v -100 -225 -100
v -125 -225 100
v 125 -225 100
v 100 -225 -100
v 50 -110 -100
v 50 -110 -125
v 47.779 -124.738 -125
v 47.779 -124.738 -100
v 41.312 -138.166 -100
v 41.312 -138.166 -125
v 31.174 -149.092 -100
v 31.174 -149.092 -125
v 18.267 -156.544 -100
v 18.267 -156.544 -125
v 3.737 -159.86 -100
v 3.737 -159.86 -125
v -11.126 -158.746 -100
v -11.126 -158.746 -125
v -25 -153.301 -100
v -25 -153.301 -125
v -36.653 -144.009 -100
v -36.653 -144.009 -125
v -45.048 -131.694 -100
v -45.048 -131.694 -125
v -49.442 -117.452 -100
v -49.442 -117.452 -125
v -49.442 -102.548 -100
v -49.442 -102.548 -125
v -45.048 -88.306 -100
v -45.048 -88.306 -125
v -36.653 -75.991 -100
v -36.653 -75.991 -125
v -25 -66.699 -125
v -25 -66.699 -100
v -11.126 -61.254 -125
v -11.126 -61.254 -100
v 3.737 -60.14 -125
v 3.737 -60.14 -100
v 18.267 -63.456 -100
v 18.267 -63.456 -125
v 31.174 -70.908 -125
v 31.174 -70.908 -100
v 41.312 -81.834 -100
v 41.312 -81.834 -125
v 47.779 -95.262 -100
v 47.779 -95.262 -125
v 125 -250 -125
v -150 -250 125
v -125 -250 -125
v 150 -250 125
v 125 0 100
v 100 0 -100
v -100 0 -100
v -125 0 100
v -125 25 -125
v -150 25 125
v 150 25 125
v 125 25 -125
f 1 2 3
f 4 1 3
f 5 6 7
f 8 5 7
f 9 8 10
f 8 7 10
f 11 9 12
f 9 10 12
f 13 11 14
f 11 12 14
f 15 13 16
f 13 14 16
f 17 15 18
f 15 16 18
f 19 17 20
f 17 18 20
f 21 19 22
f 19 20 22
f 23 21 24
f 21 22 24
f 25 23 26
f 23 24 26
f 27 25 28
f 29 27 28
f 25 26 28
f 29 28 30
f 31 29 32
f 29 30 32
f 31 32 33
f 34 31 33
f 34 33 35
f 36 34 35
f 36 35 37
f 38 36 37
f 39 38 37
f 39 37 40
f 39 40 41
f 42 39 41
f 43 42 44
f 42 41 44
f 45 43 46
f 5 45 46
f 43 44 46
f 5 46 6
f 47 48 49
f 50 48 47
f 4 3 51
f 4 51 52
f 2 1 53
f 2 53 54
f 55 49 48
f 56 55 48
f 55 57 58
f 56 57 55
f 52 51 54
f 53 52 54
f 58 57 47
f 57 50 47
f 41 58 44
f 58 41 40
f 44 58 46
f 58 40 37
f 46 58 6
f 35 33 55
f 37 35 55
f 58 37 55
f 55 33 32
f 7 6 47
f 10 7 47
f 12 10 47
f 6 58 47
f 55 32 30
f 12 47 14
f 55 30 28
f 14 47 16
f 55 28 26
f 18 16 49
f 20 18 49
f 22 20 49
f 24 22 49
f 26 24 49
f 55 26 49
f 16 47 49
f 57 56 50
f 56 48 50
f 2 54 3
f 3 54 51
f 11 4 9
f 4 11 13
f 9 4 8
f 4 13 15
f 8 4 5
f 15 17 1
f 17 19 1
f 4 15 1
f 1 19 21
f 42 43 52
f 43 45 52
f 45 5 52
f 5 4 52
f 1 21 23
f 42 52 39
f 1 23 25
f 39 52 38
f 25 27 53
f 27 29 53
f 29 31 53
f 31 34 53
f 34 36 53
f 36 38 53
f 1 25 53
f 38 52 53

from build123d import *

# Parameters (mm, degrees)
F1_DEPTH = 225
F4_DEPTH = 25
F6_DEPTH = 25
F7_R     = 50
F8_DEPTH = 25


with BuildPart() as f1:
    # F0 (on Front) → F1 (new body)
    with BuildSketch(Plane.XZ):
        Polygon((-125, -125), (125, -125), (150, 125), (-150, 125), align=None)
        Polygon((125, 100), (100, -100), (-100, -100), (-125, 100), align=None, mode=Mode.SUBTRACT)
    extrude(amount=F1_DEPTH)

    # F3 (on face) + F2 (on face) → F4 (join)
    with BuildSketch(Plane.XZ.offset(225)):
        Polygon((125, -125), (150, 125), (-150, 125), (-125, -125), align=None)
    with BuildSketch(Plane.XZ.offset(225)):
        Polygon((-150, 125), (-125, -125), (125, -125), (150, 125), align=None)
        Polygon((-100, -100), (-125, 100), (125, 100), (100, -100), align=None, mode=Mode.SUBTRACT)
    extrude(amount=F4_DEPTH)

    # F5 (on face) → F6 (join)
    with BuildSketch(Plane(origin=(0, 0, 0), x_dir=(-1, 0, 0), z_dir=(0, 1, 0))):
        Polygon((125, -125), (150, 125), (-150, 125), (-125, -125), align=None)
    extrude(amount=F6_DEPTH)

    # F7 (on face) → F8 (cut)
    with BuildSketch(Plane(origin=(0, 0, -125), x_dir=(1, 0, 0), z_dir=(0, 0, -1))):
        with Locations((0, 110)):
            Circle(F7_R)
    extrude(amount=-F8_DEPTH, mode=Mode.SUBTRACT)


solid = f1.part
